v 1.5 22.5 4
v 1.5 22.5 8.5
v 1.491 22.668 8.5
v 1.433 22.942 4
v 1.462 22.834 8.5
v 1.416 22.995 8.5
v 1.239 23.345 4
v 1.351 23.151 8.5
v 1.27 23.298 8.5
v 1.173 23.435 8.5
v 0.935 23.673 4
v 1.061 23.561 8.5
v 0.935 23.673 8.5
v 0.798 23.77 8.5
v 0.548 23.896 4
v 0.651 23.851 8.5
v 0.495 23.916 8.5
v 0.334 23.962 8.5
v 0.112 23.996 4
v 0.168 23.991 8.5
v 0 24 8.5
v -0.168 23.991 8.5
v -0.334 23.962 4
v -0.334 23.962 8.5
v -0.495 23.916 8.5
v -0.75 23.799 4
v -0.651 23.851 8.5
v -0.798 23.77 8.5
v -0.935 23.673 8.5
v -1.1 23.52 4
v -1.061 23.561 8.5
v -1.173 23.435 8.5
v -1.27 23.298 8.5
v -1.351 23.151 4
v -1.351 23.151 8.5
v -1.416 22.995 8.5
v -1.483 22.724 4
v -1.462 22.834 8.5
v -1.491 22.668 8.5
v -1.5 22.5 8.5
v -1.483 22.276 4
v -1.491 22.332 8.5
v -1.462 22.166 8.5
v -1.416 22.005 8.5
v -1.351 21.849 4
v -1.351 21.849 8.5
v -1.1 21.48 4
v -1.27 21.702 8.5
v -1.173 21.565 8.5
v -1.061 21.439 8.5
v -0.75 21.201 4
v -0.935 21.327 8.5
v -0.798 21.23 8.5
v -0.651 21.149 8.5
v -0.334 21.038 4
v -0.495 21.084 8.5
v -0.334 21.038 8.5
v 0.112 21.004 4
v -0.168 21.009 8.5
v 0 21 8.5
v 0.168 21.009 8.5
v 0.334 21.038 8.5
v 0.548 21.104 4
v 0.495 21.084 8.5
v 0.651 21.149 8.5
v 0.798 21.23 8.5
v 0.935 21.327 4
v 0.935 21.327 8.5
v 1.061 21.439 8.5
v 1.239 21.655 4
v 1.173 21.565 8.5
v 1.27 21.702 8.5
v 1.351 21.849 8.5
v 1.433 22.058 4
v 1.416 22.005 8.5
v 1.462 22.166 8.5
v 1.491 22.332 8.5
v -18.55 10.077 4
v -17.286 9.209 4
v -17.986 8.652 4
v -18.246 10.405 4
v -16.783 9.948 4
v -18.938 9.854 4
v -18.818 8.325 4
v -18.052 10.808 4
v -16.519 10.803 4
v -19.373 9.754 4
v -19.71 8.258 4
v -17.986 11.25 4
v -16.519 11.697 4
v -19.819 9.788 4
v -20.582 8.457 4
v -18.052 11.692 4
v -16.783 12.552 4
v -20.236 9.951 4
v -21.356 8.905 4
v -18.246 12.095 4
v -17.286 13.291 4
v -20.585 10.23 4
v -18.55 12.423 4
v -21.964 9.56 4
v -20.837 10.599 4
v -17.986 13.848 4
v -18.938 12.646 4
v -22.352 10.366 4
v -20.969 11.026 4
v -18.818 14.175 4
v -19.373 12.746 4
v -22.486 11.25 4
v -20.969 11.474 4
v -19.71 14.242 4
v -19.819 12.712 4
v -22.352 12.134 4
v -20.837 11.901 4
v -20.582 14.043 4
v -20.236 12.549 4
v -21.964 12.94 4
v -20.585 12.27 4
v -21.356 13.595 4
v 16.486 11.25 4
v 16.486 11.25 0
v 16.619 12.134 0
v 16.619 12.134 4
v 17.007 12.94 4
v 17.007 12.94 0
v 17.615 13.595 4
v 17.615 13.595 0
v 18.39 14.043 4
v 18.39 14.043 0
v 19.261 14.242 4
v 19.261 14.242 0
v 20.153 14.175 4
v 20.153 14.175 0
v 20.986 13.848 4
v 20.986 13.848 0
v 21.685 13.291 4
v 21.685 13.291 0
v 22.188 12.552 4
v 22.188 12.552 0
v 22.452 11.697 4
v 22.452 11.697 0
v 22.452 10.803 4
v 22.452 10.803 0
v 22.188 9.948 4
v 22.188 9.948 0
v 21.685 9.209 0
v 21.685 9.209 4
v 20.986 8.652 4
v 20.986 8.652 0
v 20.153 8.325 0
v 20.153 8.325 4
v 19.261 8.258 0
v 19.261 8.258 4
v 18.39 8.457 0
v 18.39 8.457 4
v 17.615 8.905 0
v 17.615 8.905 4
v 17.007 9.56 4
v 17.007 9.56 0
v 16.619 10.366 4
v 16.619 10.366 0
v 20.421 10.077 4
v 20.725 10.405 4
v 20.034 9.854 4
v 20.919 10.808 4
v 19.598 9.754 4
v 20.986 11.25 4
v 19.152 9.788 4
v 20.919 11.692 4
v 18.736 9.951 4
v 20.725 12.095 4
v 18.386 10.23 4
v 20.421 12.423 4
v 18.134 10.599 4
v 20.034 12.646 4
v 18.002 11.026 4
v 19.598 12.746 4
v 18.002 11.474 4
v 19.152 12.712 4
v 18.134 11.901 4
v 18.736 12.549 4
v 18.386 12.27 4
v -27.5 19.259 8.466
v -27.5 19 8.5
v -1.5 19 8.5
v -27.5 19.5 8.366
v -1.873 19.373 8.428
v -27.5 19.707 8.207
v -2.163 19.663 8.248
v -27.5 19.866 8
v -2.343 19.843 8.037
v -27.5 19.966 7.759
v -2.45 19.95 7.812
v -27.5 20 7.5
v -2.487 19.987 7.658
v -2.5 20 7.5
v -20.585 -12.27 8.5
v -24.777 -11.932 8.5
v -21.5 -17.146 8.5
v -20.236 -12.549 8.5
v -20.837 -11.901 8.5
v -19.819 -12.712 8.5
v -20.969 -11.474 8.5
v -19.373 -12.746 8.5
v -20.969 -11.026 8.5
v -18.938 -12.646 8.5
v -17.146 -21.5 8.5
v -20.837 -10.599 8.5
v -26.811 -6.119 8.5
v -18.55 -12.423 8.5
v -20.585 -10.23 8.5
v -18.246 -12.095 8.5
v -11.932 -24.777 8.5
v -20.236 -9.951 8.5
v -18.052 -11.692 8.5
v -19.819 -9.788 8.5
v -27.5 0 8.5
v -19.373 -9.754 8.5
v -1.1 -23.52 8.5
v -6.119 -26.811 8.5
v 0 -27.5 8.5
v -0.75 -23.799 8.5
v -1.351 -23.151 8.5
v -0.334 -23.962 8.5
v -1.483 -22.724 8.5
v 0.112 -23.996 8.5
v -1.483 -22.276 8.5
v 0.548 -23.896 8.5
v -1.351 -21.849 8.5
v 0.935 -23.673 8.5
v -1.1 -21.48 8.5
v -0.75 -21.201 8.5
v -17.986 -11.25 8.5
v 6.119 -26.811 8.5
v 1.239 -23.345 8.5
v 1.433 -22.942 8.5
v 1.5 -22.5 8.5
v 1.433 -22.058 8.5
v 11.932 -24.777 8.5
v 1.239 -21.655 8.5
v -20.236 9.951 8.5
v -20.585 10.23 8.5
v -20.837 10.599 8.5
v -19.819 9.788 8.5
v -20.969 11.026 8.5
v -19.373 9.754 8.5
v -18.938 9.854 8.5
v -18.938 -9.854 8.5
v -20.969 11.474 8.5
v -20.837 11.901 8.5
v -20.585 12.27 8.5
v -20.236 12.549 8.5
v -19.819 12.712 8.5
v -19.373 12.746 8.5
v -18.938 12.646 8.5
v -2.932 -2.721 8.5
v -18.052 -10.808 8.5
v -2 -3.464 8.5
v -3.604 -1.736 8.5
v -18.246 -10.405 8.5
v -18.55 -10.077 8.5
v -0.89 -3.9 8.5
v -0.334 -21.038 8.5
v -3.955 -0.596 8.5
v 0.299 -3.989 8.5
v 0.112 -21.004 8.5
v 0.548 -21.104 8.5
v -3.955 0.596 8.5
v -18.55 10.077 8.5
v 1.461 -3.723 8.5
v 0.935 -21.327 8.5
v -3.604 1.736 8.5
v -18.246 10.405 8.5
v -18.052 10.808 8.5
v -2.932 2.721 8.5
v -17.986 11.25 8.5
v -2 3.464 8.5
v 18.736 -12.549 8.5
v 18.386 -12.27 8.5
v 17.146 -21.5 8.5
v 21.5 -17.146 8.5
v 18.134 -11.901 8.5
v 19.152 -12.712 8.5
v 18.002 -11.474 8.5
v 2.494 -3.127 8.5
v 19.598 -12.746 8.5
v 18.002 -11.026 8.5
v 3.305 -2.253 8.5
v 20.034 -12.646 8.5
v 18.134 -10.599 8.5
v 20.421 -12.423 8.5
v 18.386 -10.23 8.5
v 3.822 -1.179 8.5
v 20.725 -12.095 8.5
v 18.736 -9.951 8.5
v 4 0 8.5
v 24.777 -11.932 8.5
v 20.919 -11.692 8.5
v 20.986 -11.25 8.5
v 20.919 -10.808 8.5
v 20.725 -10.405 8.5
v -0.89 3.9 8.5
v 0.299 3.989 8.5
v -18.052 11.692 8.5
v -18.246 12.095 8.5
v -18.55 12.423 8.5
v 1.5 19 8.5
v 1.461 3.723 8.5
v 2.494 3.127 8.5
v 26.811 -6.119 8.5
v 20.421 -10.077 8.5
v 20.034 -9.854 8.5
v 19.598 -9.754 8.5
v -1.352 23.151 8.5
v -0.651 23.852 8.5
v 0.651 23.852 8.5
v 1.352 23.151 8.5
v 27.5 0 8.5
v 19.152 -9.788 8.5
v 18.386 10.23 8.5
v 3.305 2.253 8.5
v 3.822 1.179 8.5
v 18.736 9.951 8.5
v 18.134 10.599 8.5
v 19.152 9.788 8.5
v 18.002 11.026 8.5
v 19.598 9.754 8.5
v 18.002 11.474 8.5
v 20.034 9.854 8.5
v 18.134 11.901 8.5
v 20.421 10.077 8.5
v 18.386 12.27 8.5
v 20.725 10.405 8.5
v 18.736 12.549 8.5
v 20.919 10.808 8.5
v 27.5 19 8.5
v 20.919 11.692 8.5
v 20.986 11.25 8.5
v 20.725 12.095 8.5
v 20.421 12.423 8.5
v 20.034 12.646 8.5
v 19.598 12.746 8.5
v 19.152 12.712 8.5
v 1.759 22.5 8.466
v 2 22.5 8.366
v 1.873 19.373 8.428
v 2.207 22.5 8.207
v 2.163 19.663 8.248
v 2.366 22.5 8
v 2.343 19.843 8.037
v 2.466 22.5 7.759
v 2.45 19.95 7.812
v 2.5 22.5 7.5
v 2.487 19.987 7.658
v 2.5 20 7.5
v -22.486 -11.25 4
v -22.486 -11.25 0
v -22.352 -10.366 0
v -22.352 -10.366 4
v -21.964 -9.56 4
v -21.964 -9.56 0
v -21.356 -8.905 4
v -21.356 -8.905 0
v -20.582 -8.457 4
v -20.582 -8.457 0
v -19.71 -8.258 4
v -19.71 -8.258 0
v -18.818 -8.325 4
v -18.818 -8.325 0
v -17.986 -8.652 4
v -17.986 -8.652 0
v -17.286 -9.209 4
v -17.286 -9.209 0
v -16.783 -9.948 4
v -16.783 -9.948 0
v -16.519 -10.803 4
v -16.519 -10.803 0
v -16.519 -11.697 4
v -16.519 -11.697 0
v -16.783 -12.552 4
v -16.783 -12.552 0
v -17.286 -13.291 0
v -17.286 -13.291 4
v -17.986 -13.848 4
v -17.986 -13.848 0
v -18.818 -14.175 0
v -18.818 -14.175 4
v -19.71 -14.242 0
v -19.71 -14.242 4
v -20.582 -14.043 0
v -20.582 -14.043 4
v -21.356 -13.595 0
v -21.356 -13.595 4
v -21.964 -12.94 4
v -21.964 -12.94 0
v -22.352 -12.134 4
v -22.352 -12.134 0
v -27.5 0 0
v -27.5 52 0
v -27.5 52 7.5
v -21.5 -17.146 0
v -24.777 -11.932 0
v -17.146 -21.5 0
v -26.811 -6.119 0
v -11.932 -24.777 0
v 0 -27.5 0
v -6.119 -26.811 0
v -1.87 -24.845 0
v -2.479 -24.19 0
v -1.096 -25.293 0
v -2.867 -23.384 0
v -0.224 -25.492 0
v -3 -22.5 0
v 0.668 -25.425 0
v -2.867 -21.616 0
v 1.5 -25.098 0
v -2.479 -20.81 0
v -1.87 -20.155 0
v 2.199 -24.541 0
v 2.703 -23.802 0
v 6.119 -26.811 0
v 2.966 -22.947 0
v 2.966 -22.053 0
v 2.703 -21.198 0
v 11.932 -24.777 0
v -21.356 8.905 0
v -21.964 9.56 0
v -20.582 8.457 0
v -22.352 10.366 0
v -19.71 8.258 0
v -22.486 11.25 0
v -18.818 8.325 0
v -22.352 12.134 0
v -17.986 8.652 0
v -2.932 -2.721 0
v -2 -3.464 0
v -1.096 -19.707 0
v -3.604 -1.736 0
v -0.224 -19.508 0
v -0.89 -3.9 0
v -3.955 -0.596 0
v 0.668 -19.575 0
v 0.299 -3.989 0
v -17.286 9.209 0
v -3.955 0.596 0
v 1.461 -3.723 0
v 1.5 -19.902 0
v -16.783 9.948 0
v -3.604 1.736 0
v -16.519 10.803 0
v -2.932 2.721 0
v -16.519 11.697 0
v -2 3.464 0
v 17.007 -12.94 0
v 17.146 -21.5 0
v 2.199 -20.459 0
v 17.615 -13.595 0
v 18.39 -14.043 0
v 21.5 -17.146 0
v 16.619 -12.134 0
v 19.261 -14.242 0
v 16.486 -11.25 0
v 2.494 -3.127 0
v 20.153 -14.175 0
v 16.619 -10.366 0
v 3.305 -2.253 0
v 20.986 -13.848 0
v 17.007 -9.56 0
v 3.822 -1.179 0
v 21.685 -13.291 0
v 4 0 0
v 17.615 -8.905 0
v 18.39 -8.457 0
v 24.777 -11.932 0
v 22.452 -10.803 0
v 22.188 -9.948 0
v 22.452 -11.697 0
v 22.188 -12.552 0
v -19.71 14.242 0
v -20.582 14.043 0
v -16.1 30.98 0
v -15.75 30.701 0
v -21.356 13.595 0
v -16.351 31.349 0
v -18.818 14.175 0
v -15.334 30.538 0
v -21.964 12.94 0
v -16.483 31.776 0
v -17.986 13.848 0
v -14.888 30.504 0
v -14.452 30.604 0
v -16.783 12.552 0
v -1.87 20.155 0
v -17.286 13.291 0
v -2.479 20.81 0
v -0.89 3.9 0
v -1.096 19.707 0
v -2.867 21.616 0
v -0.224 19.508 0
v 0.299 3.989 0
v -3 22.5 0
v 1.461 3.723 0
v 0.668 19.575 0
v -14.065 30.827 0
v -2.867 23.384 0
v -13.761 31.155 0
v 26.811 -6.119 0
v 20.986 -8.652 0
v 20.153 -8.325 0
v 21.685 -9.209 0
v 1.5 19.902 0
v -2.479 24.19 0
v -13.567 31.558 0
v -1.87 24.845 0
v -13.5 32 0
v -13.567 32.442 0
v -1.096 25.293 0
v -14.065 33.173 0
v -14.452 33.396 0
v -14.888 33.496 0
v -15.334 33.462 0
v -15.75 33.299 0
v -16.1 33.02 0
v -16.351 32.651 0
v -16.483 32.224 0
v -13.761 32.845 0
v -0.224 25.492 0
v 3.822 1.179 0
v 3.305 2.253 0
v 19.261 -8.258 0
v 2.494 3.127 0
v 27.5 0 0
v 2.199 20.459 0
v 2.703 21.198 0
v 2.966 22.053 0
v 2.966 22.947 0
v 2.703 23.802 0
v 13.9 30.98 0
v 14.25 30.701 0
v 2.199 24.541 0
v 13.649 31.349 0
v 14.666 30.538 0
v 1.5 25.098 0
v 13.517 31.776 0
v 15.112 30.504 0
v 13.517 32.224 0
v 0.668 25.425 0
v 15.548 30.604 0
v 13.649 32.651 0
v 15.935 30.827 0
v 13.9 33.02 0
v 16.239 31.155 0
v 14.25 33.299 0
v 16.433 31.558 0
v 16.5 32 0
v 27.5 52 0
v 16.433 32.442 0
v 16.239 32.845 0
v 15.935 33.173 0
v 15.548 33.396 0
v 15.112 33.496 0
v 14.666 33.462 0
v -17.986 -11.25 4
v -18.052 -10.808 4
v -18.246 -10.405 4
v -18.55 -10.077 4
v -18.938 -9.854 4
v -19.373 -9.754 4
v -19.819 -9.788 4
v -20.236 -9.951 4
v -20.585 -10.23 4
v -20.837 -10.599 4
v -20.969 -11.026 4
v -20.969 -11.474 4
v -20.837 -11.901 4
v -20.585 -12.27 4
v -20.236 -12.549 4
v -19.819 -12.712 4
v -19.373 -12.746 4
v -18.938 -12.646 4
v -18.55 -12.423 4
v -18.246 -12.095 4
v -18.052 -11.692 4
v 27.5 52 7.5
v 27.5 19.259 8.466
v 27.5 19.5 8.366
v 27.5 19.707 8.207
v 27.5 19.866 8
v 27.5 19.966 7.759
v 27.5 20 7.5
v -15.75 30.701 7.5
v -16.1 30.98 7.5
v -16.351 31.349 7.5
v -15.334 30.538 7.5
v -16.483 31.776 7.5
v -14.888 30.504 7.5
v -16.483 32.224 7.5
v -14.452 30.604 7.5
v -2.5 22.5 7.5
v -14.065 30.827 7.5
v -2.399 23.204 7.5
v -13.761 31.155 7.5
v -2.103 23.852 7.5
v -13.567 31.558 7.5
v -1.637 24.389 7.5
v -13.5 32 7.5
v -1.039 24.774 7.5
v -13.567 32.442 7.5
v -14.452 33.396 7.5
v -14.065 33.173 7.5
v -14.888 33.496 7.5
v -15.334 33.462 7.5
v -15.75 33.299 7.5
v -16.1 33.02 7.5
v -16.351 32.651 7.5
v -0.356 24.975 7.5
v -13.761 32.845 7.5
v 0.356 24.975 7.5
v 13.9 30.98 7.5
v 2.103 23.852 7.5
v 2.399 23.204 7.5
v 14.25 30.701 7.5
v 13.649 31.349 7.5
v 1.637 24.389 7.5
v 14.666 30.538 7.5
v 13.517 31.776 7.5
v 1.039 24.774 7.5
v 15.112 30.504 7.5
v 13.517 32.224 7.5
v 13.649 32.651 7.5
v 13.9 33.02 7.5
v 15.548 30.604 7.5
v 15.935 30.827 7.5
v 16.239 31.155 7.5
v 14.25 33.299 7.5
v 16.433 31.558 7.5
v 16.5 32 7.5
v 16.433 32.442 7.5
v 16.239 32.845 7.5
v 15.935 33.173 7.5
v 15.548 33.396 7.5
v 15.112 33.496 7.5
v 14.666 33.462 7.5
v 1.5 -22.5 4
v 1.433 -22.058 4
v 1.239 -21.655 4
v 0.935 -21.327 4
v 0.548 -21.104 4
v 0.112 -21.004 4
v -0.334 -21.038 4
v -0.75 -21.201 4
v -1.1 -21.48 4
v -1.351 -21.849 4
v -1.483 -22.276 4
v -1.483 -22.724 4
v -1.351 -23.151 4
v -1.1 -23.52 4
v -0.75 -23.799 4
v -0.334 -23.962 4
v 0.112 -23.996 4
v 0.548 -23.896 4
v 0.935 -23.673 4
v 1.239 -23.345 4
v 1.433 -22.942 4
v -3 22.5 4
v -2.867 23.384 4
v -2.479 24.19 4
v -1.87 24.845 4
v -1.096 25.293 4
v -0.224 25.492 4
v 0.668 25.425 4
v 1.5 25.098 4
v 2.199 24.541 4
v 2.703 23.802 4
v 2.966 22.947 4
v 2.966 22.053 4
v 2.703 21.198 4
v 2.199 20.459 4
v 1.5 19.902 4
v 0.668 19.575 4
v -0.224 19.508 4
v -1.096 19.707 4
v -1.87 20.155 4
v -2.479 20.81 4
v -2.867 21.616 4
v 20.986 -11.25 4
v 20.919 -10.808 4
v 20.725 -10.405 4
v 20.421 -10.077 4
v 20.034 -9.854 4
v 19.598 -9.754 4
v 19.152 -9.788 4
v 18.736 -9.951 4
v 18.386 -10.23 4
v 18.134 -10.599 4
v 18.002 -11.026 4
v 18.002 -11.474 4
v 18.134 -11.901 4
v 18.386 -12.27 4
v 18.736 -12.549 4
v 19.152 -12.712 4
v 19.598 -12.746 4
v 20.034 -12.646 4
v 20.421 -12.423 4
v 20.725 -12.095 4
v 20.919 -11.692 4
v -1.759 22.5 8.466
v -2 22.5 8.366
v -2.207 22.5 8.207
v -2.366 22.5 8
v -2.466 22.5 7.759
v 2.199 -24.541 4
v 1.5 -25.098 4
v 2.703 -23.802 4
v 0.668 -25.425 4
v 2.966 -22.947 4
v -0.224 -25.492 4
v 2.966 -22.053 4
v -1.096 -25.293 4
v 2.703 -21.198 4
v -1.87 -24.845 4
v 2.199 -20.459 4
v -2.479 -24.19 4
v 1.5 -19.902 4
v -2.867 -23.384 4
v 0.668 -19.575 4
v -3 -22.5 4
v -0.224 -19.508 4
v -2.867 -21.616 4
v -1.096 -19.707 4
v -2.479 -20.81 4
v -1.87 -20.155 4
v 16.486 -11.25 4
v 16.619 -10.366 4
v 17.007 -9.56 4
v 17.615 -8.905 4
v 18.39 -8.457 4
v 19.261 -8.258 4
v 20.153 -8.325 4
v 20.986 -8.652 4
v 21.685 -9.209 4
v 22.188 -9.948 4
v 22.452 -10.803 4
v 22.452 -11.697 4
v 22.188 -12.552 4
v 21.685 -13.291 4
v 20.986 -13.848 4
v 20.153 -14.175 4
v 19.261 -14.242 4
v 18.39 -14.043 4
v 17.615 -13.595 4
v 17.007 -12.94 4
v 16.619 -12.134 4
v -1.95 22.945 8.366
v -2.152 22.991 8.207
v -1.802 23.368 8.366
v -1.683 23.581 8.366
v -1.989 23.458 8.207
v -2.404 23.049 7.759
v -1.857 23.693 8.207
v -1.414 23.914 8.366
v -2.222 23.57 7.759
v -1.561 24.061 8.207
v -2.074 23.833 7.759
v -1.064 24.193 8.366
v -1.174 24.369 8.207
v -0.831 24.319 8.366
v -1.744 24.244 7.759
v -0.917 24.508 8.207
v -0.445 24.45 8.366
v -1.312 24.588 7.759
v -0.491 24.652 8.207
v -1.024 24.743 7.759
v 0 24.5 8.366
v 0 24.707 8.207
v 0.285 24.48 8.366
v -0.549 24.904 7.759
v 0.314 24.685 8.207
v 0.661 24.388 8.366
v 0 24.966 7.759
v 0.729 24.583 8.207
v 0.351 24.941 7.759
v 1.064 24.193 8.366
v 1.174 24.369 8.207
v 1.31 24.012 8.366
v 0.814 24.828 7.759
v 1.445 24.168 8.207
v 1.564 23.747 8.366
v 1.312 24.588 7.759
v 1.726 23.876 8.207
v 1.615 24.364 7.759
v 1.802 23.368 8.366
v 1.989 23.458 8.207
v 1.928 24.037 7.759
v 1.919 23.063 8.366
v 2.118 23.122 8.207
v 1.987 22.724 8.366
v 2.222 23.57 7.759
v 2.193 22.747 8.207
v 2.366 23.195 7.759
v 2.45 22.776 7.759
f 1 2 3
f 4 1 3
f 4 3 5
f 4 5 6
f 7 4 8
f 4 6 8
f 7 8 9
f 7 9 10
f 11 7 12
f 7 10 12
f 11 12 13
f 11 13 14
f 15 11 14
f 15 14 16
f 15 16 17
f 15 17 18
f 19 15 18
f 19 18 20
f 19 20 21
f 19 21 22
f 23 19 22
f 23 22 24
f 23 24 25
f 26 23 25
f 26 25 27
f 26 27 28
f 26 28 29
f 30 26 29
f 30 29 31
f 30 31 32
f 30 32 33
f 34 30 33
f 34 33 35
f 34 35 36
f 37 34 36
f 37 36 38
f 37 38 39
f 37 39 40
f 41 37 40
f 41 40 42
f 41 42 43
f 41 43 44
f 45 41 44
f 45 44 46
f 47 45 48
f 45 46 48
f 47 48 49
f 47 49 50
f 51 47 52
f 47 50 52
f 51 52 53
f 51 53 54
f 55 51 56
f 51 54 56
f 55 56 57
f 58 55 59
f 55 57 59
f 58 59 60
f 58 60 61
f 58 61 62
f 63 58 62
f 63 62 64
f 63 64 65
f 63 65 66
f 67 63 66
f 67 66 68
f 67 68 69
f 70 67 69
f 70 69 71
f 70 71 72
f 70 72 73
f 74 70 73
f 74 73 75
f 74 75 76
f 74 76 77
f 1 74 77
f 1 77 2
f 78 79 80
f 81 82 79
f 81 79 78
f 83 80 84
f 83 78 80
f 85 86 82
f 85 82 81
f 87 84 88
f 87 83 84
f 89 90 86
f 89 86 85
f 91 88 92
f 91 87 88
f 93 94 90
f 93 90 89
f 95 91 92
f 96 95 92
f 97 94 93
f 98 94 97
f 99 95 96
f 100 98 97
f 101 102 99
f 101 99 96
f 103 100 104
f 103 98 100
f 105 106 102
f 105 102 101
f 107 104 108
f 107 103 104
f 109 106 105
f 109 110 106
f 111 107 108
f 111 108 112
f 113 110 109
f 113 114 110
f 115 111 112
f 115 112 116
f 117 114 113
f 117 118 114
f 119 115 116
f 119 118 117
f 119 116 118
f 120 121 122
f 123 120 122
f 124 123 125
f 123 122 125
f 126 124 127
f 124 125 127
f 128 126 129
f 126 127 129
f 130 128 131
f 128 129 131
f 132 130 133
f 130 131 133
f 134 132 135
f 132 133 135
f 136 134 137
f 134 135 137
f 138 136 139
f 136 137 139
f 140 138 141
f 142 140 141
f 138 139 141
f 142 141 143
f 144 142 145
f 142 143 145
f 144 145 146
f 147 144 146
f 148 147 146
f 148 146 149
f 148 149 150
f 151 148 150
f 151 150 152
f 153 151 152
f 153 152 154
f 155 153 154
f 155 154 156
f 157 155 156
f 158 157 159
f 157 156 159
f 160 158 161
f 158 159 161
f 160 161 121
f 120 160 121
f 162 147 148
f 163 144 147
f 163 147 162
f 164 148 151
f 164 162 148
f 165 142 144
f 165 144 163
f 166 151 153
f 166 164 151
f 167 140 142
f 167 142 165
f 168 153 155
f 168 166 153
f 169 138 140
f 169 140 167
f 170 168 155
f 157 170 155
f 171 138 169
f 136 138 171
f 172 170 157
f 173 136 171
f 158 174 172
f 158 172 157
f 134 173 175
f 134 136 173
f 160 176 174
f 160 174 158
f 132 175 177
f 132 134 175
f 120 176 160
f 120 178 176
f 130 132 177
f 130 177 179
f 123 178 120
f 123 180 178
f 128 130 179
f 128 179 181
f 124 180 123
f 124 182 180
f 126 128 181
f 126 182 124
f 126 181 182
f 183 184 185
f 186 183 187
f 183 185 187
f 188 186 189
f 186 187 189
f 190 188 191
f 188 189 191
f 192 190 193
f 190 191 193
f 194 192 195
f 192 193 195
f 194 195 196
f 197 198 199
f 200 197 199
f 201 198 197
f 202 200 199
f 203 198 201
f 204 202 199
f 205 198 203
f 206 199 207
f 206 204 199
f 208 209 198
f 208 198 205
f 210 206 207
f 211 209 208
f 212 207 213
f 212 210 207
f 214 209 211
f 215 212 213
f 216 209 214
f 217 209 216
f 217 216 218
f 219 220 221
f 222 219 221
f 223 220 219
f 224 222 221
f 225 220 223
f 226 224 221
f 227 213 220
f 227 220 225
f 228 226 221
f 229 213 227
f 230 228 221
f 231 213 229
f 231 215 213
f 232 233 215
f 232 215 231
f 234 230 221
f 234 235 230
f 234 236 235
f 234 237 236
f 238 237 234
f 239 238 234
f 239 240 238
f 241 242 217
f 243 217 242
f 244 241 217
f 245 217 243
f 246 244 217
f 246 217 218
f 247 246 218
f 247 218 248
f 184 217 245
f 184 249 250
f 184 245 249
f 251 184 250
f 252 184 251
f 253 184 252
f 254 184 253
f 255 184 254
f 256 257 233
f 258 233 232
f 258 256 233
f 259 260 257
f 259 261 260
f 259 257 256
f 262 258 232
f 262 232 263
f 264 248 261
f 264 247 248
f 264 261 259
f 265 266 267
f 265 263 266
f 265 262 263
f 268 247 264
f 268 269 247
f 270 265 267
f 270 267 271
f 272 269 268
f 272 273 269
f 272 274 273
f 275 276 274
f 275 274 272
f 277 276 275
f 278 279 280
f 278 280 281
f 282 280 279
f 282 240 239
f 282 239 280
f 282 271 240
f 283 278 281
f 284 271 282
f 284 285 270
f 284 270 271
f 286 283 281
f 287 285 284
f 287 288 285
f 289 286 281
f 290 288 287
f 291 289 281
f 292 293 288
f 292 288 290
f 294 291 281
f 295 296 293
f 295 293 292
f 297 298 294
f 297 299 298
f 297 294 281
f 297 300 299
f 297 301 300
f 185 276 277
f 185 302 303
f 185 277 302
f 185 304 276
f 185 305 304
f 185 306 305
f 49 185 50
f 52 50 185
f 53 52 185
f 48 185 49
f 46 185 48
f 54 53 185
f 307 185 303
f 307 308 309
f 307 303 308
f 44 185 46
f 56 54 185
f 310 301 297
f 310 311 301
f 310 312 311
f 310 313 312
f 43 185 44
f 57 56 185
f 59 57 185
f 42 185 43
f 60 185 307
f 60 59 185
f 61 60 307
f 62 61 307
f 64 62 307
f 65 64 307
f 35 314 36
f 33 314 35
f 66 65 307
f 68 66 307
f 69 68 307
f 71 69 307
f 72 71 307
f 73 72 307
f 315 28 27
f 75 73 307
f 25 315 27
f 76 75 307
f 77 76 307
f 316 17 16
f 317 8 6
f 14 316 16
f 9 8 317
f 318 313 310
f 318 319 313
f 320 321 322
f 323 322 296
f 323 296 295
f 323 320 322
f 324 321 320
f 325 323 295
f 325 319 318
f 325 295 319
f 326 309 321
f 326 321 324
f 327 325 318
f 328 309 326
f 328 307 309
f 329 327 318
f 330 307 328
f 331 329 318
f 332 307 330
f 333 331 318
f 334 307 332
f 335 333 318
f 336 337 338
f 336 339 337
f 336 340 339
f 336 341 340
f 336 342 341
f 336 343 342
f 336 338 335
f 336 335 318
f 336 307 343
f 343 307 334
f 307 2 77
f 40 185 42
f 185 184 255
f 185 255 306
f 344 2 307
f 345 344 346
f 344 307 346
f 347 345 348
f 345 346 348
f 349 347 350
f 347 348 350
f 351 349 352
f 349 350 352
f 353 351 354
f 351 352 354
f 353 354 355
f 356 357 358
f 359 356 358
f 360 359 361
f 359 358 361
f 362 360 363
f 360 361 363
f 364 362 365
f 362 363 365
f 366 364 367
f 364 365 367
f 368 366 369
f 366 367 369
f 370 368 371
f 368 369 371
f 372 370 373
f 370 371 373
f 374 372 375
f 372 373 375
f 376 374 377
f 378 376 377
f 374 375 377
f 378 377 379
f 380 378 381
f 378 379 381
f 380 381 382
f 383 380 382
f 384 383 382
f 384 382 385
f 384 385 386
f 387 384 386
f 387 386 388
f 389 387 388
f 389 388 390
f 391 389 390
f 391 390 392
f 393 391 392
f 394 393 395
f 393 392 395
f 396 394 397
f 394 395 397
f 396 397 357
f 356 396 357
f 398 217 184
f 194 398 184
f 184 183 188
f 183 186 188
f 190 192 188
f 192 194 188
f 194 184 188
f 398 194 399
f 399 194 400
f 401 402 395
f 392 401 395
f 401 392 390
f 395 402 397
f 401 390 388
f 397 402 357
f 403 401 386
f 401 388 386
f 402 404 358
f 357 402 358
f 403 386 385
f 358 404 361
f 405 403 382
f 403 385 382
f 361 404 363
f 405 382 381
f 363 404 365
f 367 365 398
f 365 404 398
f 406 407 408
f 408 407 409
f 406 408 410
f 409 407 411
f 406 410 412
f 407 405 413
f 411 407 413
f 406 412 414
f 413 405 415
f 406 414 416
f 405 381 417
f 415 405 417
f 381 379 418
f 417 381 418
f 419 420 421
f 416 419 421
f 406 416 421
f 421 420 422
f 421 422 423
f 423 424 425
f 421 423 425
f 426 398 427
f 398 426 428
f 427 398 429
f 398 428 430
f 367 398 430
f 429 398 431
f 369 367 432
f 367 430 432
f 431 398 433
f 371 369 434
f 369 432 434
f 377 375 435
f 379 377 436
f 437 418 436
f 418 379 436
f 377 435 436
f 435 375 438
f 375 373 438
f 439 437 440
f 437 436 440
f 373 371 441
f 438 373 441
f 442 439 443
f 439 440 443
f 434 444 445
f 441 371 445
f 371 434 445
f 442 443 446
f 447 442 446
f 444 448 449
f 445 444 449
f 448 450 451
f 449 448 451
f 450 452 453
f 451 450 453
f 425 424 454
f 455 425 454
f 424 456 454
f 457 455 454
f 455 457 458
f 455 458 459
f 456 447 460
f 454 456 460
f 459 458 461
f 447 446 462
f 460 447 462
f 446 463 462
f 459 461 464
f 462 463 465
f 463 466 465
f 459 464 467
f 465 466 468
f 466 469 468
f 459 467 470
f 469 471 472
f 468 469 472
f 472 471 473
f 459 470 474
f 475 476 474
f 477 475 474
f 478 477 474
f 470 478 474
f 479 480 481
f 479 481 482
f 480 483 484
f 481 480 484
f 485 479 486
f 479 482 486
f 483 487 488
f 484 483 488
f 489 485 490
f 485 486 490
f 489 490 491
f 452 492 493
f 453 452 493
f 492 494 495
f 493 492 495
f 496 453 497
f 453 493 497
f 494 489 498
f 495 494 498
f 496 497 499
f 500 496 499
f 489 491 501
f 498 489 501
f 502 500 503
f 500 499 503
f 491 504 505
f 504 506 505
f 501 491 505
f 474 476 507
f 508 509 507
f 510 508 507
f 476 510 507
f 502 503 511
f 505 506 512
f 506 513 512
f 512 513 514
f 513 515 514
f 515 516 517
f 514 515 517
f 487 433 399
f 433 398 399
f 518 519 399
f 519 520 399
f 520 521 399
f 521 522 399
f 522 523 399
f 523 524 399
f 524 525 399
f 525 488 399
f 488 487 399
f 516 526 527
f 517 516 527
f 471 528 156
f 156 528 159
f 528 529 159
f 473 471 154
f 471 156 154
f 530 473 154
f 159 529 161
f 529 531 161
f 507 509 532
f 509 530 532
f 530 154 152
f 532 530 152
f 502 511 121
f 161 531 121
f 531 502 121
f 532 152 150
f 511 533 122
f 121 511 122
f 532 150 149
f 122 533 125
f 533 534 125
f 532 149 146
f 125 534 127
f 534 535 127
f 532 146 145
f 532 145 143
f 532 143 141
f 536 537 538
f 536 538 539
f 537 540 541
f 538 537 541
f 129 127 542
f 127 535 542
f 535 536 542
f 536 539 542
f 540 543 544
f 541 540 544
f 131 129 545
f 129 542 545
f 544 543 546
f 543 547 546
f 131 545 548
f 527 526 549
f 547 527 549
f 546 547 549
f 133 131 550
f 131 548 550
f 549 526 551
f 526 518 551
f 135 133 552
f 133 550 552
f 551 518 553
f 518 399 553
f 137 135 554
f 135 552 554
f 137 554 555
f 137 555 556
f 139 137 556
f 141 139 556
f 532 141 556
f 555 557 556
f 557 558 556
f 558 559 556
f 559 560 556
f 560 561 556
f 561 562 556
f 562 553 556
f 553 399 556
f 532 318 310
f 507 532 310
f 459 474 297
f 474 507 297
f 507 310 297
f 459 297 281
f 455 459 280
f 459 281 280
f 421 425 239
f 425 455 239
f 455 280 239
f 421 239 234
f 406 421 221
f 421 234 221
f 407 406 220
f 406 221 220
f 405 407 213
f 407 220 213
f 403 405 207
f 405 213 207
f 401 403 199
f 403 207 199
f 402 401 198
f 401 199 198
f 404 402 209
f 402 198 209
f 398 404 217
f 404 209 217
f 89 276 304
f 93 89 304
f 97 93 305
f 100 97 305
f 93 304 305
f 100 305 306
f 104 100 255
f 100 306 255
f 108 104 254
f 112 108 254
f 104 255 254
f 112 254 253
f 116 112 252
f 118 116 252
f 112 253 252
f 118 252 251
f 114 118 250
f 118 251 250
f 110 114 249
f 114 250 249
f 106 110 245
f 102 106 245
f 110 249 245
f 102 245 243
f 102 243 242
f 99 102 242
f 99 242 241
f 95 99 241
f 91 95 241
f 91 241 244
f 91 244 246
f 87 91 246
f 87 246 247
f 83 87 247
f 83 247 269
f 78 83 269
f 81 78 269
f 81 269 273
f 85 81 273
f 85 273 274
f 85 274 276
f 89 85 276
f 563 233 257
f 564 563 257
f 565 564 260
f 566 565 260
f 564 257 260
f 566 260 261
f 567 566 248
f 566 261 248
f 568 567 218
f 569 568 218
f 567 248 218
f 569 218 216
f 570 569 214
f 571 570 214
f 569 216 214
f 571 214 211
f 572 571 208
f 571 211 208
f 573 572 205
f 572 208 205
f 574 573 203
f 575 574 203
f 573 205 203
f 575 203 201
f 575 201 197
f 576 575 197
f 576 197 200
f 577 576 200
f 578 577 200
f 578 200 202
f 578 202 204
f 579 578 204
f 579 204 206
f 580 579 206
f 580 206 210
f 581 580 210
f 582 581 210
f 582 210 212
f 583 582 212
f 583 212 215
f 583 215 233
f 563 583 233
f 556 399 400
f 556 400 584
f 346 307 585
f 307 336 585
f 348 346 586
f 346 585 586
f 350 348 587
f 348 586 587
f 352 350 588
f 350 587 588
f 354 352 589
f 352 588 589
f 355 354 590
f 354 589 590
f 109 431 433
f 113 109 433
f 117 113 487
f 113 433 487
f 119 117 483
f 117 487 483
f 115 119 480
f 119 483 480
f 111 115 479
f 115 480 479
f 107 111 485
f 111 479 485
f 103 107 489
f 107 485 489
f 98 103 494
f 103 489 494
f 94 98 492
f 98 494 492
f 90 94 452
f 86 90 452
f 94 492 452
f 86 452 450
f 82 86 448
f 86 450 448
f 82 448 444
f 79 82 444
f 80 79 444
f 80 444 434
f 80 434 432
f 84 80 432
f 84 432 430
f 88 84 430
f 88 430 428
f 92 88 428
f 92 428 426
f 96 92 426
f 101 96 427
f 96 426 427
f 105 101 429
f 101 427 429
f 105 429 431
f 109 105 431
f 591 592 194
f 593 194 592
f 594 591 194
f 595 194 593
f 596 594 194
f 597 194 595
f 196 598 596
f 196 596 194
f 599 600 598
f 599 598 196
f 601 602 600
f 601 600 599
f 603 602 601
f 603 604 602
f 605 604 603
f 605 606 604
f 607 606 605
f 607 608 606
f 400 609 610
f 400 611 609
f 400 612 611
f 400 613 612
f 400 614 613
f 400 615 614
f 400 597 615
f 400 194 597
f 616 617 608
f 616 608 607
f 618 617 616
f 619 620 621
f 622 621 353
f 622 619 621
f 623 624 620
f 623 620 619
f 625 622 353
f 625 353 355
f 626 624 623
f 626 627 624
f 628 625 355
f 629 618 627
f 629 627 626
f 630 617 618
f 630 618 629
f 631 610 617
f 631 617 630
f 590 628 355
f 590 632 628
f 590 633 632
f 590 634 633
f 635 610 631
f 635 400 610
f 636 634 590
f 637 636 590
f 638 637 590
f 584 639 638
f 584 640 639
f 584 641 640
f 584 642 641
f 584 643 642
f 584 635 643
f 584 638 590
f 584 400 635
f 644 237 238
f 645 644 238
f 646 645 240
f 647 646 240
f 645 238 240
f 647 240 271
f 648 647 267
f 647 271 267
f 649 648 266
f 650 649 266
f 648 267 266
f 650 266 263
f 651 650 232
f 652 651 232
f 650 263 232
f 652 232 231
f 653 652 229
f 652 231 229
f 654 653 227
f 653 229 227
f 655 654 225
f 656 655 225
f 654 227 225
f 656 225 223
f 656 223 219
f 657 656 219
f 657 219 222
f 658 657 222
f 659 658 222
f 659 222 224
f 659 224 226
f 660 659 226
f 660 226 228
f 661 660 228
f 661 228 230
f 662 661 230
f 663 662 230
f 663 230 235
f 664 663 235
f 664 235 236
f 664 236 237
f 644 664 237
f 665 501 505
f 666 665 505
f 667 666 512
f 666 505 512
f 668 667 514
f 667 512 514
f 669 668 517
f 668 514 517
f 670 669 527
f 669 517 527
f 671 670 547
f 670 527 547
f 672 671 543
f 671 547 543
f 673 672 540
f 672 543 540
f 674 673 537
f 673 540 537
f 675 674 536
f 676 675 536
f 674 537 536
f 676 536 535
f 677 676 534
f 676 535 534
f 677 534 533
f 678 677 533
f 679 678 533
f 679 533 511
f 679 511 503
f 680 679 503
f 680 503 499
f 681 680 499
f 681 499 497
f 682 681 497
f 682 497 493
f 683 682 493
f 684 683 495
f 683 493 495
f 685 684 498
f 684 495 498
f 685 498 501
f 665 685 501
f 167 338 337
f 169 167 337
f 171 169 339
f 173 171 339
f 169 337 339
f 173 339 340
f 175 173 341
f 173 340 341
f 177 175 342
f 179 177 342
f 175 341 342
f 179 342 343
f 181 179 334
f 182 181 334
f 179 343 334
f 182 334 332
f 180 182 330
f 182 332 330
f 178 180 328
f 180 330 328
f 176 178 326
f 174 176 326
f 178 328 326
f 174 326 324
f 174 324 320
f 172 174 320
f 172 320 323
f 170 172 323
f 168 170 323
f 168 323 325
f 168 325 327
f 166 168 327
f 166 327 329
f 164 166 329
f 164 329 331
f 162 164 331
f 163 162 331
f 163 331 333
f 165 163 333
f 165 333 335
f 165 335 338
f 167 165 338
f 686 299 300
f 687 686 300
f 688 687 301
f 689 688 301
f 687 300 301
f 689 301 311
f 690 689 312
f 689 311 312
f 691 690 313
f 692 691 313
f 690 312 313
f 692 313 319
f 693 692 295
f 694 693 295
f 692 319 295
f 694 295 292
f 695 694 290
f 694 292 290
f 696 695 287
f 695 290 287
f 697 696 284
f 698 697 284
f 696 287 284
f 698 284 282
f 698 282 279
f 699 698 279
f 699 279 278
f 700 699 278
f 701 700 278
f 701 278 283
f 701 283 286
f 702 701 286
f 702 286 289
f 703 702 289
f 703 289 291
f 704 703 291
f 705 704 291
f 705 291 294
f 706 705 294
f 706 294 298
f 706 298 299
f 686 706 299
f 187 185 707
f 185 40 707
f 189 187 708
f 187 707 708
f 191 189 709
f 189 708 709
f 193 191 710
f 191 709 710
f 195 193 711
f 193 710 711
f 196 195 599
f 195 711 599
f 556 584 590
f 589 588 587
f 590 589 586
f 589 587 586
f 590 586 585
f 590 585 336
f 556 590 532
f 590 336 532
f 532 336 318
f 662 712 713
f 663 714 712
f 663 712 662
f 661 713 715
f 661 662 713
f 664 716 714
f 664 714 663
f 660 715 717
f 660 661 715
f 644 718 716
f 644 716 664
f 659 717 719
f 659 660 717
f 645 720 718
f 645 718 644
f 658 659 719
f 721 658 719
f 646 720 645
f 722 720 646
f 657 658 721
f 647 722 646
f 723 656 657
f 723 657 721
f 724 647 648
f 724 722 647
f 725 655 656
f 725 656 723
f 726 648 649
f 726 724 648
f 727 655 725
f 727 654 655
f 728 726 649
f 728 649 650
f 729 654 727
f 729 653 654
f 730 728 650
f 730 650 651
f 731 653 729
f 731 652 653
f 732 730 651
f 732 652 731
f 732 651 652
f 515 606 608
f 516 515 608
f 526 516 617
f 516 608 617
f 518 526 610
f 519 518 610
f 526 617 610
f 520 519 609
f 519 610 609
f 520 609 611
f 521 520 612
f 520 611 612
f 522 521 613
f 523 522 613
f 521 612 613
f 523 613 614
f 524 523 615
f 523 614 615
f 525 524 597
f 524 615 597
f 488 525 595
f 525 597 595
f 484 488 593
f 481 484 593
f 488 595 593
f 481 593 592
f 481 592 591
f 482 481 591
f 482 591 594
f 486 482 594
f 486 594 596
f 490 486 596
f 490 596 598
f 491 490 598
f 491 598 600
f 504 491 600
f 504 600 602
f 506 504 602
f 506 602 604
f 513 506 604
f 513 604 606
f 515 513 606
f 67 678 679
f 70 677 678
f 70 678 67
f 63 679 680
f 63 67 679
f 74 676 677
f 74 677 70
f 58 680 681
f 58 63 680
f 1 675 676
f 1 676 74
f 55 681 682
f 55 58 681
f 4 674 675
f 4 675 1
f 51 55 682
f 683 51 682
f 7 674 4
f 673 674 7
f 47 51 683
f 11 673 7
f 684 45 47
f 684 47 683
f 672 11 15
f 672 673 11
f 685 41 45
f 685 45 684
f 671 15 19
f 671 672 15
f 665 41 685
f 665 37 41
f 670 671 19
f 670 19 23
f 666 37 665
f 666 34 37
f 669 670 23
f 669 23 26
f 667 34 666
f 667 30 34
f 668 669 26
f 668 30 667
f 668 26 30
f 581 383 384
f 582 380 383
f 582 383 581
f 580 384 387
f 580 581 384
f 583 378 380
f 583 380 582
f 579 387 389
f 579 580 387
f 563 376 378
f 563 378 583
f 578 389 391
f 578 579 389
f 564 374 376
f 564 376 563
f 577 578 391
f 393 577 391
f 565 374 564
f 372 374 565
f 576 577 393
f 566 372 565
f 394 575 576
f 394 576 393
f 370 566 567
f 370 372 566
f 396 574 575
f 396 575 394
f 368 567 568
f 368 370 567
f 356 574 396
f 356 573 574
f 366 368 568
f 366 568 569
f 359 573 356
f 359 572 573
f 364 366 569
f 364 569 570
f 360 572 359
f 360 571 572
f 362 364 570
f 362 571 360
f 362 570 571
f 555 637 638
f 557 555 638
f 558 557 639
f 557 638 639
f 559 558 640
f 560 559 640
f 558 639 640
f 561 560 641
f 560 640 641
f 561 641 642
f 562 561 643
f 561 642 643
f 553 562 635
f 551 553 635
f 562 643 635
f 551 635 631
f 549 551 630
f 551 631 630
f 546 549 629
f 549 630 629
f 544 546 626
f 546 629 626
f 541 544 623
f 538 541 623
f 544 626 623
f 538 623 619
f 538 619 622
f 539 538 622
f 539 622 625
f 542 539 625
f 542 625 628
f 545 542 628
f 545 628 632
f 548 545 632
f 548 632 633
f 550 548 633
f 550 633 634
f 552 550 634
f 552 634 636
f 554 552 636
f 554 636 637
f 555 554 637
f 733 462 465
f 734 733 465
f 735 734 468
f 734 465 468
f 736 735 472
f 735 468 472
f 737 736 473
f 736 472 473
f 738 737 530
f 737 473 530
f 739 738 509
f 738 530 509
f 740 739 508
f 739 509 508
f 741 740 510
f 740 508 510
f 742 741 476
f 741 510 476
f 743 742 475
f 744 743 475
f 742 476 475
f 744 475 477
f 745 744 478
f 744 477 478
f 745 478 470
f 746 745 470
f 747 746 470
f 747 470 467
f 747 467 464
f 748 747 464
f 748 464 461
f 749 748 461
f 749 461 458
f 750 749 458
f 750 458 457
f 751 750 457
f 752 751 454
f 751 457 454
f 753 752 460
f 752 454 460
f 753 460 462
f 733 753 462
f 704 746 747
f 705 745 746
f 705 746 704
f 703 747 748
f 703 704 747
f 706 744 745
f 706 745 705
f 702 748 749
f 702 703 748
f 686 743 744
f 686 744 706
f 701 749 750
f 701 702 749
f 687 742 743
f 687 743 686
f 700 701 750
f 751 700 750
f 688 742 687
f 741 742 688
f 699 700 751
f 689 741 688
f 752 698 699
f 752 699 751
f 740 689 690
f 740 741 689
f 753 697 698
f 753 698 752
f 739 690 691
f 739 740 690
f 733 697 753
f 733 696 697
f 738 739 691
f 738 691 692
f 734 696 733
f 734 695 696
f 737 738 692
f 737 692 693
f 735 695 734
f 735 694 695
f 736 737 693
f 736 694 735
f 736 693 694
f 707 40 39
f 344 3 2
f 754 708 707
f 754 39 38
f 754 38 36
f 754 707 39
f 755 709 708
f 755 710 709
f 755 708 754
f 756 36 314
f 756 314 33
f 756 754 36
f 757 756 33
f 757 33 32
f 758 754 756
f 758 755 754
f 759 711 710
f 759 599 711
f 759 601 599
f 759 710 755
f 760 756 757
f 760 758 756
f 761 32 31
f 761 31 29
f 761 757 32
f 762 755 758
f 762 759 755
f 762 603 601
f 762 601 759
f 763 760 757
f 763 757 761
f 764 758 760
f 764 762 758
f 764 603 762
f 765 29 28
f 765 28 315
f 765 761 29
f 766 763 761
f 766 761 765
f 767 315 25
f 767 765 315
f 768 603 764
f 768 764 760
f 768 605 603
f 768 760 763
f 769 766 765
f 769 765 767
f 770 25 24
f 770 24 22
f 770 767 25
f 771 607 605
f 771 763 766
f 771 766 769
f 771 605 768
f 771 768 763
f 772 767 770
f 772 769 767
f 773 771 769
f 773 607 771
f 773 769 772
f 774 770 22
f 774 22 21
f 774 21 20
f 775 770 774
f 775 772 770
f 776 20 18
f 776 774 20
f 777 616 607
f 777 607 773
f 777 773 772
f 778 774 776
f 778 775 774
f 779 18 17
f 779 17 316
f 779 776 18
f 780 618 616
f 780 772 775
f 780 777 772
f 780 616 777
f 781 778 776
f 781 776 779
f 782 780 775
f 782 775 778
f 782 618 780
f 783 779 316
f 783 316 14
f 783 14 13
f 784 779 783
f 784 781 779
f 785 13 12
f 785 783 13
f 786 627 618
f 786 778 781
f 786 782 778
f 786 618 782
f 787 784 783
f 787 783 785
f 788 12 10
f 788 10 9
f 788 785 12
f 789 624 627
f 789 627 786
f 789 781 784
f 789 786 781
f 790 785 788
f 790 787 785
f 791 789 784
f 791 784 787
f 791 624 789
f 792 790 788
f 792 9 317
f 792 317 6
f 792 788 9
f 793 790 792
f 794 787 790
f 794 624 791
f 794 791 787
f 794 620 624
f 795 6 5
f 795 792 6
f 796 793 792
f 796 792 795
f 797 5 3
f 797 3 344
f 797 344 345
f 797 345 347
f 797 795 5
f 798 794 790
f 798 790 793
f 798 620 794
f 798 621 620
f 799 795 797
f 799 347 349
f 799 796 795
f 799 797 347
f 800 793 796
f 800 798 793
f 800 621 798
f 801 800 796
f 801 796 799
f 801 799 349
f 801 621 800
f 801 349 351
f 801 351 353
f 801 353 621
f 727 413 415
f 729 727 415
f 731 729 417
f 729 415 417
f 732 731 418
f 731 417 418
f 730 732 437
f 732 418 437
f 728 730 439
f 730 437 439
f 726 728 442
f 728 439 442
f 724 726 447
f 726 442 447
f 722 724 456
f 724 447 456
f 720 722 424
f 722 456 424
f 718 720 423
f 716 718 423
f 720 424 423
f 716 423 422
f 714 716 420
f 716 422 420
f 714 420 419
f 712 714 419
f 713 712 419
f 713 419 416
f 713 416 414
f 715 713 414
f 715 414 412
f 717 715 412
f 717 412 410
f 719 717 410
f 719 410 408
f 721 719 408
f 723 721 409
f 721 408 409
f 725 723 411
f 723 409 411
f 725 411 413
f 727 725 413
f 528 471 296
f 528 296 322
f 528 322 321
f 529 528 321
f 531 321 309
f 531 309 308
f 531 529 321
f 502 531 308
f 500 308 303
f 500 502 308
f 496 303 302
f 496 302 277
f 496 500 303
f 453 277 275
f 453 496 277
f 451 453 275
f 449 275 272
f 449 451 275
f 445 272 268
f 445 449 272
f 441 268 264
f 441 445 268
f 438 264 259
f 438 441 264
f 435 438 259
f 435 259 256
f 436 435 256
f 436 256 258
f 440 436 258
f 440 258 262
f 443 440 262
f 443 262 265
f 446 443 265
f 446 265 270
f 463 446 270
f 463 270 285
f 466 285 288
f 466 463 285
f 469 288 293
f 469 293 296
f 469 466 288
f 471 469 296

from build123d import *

# Parameters (mm, degrees)
ESQUISSE1_W             = 100
ESQUISSE1_H             = 100.548113933
ESQUISSE1_R             = 4
BOSS_EXTRU_1_DEPTH      = 8.5
ESQUISSE2_R             = 1.5
ENL_V_MAT_EXTRU_1_DEPTH = 73.637800077
ENL_V_MAT_EXTRU_6_DEPTH = 1
CONG_4_R                = 1
ESQUISSE4_R             = 3
ENL_V_MAT_EXTRU_7_DEPTH = 4


with BuildPart() as part:
    # Esquisse1 → Boss.-Extru.1 (new body)
    with BuildSketch(Plane.XY):
        with Locations((0, 1.725943033)):
            Rectangle(ESQUISSE1_W, ESQUISSE1_H)
        Circle(ESQUISSE1_R, mode=Mode.SUBTRACT)
    extrude(amount=BOSS_EXTRU_1_DEPTH)

    # Esquisse2 → Enlèv. mat.-Extru.1 (cut, through all)
    with BuildSketch(Plane.XY.offset(8.5)):
        with BuildLine():
            Line((27.5, 52), (27.5, 0))
            ThreePointArc((27.5, 0), (0, -27.5), (-27.5, 0))
            Line((-27.5, 0), (-27.5, 52))
            Line((-27.5, 52), (-50, 52))
            Line((-50, 52), (-50, -48.548113933))
            Line((-50, -48.548113933), (50, -48.548113933))
            Line((50, -48.548113933), (50, 52))
            Line((50, 52), (27.5, 52))
        make_face()
        with Locations((0, 22.5)):
            Circle(ESQUISSE2_R)
        with Locations((19.485571585, 11.25)):
            Circle(ESQUISSE2_R)
        with Locations((19.485571585, -11.25)):
            Circle(ESQUISSE2_R)
        with Locations((0, -22.5)):
            Circle(ESQUISSE2_R)
        with Locations((-19.485571585, -11.25)):
            Circle(ESQUISSE2_R)
        with Locations((-19.485571585, 11.25)):
            Circle(ESQUISSE2_R)
        with Locations((-15, 32)):
            Circle(ESQUISSE2_R)
        with Locations((15, 32)):
            Circle(ESQUISSE2_R)
    extrude(amount=-ENL_V_MAT_EXTRU_1_DEPTH, mode=Mode.SUBTRACT)

    # Esquisse3 → Enlèv. mat.-Extru.6 (cut)
    with BuildSketch(Plane.XY.offset(8.5)):
        with BuildLine():
            Line((27.5, 52), (-27.5, 52))
            Line((-27.5, 52), (-27.5, 20))
            Line((-27.5, 20), (-2.5, 20))
            Line((-2.5, 20), (-2.5, 22.5))
            ThreePointArc((-2.5, 22.5), (0, 25), (2.5, 22.5))
            Line((2.5, 22.5), (2.5, 20))
            Line((2.5, 20), (27.5, 20))
            Line((27.5, 20), (27.5, 52))
        make_face()
    extrude(amount=-ENL_V_MAT_EXTRU_6_DEPTH, mode=Mode.SUBTRACT)

    # Congé4
    cong_4_edges = [part.edges().sort_by_distance(p)[0] for p in [
        (-15, 20, 8.5),
        (15, 20, 8.5),
        (2.5, 21.25, 8.5),
        (-2.5, 21.25, 8.5),
        (0, 25, 8.5),
    ]]
    fillet(cong_4_edges, radius=CONG_4_R - 0.0001)  # a hair under: the kernel refuses the full size

    # Esquisse4 → Enlèv. mat.-Extru.7 (cut)
    with BuildSketch(Plane(origin=(0, 0, 0), x_dir=(-1, 0, 0), z_dir=(0, 0, -1))):
        with Locations((0, 22.5)):
            Circle(ESQUISSE4_R)
        with Locations((19.485571585, 11.25)):
            Circle(ESQUISSE4_R)
        with Locations((19.485571585, -11.25)):
            Circle(ESQUISSE4_R)
        with Locations((0, -22.5)):
            Circle(ESQUISSE4_R)
        with Locations((-19.485571585, -11.25)):
            Circle(ESQUISSE4_R)
        with Locations((-19.485571585, 11.25)):
            Circle(ESQUISSE4_R)
    extrude(amount=-ENL_V_MAT_EXTRU_7_DEPTH, mode=Mode.SUBTRACT)


solid = part.part
